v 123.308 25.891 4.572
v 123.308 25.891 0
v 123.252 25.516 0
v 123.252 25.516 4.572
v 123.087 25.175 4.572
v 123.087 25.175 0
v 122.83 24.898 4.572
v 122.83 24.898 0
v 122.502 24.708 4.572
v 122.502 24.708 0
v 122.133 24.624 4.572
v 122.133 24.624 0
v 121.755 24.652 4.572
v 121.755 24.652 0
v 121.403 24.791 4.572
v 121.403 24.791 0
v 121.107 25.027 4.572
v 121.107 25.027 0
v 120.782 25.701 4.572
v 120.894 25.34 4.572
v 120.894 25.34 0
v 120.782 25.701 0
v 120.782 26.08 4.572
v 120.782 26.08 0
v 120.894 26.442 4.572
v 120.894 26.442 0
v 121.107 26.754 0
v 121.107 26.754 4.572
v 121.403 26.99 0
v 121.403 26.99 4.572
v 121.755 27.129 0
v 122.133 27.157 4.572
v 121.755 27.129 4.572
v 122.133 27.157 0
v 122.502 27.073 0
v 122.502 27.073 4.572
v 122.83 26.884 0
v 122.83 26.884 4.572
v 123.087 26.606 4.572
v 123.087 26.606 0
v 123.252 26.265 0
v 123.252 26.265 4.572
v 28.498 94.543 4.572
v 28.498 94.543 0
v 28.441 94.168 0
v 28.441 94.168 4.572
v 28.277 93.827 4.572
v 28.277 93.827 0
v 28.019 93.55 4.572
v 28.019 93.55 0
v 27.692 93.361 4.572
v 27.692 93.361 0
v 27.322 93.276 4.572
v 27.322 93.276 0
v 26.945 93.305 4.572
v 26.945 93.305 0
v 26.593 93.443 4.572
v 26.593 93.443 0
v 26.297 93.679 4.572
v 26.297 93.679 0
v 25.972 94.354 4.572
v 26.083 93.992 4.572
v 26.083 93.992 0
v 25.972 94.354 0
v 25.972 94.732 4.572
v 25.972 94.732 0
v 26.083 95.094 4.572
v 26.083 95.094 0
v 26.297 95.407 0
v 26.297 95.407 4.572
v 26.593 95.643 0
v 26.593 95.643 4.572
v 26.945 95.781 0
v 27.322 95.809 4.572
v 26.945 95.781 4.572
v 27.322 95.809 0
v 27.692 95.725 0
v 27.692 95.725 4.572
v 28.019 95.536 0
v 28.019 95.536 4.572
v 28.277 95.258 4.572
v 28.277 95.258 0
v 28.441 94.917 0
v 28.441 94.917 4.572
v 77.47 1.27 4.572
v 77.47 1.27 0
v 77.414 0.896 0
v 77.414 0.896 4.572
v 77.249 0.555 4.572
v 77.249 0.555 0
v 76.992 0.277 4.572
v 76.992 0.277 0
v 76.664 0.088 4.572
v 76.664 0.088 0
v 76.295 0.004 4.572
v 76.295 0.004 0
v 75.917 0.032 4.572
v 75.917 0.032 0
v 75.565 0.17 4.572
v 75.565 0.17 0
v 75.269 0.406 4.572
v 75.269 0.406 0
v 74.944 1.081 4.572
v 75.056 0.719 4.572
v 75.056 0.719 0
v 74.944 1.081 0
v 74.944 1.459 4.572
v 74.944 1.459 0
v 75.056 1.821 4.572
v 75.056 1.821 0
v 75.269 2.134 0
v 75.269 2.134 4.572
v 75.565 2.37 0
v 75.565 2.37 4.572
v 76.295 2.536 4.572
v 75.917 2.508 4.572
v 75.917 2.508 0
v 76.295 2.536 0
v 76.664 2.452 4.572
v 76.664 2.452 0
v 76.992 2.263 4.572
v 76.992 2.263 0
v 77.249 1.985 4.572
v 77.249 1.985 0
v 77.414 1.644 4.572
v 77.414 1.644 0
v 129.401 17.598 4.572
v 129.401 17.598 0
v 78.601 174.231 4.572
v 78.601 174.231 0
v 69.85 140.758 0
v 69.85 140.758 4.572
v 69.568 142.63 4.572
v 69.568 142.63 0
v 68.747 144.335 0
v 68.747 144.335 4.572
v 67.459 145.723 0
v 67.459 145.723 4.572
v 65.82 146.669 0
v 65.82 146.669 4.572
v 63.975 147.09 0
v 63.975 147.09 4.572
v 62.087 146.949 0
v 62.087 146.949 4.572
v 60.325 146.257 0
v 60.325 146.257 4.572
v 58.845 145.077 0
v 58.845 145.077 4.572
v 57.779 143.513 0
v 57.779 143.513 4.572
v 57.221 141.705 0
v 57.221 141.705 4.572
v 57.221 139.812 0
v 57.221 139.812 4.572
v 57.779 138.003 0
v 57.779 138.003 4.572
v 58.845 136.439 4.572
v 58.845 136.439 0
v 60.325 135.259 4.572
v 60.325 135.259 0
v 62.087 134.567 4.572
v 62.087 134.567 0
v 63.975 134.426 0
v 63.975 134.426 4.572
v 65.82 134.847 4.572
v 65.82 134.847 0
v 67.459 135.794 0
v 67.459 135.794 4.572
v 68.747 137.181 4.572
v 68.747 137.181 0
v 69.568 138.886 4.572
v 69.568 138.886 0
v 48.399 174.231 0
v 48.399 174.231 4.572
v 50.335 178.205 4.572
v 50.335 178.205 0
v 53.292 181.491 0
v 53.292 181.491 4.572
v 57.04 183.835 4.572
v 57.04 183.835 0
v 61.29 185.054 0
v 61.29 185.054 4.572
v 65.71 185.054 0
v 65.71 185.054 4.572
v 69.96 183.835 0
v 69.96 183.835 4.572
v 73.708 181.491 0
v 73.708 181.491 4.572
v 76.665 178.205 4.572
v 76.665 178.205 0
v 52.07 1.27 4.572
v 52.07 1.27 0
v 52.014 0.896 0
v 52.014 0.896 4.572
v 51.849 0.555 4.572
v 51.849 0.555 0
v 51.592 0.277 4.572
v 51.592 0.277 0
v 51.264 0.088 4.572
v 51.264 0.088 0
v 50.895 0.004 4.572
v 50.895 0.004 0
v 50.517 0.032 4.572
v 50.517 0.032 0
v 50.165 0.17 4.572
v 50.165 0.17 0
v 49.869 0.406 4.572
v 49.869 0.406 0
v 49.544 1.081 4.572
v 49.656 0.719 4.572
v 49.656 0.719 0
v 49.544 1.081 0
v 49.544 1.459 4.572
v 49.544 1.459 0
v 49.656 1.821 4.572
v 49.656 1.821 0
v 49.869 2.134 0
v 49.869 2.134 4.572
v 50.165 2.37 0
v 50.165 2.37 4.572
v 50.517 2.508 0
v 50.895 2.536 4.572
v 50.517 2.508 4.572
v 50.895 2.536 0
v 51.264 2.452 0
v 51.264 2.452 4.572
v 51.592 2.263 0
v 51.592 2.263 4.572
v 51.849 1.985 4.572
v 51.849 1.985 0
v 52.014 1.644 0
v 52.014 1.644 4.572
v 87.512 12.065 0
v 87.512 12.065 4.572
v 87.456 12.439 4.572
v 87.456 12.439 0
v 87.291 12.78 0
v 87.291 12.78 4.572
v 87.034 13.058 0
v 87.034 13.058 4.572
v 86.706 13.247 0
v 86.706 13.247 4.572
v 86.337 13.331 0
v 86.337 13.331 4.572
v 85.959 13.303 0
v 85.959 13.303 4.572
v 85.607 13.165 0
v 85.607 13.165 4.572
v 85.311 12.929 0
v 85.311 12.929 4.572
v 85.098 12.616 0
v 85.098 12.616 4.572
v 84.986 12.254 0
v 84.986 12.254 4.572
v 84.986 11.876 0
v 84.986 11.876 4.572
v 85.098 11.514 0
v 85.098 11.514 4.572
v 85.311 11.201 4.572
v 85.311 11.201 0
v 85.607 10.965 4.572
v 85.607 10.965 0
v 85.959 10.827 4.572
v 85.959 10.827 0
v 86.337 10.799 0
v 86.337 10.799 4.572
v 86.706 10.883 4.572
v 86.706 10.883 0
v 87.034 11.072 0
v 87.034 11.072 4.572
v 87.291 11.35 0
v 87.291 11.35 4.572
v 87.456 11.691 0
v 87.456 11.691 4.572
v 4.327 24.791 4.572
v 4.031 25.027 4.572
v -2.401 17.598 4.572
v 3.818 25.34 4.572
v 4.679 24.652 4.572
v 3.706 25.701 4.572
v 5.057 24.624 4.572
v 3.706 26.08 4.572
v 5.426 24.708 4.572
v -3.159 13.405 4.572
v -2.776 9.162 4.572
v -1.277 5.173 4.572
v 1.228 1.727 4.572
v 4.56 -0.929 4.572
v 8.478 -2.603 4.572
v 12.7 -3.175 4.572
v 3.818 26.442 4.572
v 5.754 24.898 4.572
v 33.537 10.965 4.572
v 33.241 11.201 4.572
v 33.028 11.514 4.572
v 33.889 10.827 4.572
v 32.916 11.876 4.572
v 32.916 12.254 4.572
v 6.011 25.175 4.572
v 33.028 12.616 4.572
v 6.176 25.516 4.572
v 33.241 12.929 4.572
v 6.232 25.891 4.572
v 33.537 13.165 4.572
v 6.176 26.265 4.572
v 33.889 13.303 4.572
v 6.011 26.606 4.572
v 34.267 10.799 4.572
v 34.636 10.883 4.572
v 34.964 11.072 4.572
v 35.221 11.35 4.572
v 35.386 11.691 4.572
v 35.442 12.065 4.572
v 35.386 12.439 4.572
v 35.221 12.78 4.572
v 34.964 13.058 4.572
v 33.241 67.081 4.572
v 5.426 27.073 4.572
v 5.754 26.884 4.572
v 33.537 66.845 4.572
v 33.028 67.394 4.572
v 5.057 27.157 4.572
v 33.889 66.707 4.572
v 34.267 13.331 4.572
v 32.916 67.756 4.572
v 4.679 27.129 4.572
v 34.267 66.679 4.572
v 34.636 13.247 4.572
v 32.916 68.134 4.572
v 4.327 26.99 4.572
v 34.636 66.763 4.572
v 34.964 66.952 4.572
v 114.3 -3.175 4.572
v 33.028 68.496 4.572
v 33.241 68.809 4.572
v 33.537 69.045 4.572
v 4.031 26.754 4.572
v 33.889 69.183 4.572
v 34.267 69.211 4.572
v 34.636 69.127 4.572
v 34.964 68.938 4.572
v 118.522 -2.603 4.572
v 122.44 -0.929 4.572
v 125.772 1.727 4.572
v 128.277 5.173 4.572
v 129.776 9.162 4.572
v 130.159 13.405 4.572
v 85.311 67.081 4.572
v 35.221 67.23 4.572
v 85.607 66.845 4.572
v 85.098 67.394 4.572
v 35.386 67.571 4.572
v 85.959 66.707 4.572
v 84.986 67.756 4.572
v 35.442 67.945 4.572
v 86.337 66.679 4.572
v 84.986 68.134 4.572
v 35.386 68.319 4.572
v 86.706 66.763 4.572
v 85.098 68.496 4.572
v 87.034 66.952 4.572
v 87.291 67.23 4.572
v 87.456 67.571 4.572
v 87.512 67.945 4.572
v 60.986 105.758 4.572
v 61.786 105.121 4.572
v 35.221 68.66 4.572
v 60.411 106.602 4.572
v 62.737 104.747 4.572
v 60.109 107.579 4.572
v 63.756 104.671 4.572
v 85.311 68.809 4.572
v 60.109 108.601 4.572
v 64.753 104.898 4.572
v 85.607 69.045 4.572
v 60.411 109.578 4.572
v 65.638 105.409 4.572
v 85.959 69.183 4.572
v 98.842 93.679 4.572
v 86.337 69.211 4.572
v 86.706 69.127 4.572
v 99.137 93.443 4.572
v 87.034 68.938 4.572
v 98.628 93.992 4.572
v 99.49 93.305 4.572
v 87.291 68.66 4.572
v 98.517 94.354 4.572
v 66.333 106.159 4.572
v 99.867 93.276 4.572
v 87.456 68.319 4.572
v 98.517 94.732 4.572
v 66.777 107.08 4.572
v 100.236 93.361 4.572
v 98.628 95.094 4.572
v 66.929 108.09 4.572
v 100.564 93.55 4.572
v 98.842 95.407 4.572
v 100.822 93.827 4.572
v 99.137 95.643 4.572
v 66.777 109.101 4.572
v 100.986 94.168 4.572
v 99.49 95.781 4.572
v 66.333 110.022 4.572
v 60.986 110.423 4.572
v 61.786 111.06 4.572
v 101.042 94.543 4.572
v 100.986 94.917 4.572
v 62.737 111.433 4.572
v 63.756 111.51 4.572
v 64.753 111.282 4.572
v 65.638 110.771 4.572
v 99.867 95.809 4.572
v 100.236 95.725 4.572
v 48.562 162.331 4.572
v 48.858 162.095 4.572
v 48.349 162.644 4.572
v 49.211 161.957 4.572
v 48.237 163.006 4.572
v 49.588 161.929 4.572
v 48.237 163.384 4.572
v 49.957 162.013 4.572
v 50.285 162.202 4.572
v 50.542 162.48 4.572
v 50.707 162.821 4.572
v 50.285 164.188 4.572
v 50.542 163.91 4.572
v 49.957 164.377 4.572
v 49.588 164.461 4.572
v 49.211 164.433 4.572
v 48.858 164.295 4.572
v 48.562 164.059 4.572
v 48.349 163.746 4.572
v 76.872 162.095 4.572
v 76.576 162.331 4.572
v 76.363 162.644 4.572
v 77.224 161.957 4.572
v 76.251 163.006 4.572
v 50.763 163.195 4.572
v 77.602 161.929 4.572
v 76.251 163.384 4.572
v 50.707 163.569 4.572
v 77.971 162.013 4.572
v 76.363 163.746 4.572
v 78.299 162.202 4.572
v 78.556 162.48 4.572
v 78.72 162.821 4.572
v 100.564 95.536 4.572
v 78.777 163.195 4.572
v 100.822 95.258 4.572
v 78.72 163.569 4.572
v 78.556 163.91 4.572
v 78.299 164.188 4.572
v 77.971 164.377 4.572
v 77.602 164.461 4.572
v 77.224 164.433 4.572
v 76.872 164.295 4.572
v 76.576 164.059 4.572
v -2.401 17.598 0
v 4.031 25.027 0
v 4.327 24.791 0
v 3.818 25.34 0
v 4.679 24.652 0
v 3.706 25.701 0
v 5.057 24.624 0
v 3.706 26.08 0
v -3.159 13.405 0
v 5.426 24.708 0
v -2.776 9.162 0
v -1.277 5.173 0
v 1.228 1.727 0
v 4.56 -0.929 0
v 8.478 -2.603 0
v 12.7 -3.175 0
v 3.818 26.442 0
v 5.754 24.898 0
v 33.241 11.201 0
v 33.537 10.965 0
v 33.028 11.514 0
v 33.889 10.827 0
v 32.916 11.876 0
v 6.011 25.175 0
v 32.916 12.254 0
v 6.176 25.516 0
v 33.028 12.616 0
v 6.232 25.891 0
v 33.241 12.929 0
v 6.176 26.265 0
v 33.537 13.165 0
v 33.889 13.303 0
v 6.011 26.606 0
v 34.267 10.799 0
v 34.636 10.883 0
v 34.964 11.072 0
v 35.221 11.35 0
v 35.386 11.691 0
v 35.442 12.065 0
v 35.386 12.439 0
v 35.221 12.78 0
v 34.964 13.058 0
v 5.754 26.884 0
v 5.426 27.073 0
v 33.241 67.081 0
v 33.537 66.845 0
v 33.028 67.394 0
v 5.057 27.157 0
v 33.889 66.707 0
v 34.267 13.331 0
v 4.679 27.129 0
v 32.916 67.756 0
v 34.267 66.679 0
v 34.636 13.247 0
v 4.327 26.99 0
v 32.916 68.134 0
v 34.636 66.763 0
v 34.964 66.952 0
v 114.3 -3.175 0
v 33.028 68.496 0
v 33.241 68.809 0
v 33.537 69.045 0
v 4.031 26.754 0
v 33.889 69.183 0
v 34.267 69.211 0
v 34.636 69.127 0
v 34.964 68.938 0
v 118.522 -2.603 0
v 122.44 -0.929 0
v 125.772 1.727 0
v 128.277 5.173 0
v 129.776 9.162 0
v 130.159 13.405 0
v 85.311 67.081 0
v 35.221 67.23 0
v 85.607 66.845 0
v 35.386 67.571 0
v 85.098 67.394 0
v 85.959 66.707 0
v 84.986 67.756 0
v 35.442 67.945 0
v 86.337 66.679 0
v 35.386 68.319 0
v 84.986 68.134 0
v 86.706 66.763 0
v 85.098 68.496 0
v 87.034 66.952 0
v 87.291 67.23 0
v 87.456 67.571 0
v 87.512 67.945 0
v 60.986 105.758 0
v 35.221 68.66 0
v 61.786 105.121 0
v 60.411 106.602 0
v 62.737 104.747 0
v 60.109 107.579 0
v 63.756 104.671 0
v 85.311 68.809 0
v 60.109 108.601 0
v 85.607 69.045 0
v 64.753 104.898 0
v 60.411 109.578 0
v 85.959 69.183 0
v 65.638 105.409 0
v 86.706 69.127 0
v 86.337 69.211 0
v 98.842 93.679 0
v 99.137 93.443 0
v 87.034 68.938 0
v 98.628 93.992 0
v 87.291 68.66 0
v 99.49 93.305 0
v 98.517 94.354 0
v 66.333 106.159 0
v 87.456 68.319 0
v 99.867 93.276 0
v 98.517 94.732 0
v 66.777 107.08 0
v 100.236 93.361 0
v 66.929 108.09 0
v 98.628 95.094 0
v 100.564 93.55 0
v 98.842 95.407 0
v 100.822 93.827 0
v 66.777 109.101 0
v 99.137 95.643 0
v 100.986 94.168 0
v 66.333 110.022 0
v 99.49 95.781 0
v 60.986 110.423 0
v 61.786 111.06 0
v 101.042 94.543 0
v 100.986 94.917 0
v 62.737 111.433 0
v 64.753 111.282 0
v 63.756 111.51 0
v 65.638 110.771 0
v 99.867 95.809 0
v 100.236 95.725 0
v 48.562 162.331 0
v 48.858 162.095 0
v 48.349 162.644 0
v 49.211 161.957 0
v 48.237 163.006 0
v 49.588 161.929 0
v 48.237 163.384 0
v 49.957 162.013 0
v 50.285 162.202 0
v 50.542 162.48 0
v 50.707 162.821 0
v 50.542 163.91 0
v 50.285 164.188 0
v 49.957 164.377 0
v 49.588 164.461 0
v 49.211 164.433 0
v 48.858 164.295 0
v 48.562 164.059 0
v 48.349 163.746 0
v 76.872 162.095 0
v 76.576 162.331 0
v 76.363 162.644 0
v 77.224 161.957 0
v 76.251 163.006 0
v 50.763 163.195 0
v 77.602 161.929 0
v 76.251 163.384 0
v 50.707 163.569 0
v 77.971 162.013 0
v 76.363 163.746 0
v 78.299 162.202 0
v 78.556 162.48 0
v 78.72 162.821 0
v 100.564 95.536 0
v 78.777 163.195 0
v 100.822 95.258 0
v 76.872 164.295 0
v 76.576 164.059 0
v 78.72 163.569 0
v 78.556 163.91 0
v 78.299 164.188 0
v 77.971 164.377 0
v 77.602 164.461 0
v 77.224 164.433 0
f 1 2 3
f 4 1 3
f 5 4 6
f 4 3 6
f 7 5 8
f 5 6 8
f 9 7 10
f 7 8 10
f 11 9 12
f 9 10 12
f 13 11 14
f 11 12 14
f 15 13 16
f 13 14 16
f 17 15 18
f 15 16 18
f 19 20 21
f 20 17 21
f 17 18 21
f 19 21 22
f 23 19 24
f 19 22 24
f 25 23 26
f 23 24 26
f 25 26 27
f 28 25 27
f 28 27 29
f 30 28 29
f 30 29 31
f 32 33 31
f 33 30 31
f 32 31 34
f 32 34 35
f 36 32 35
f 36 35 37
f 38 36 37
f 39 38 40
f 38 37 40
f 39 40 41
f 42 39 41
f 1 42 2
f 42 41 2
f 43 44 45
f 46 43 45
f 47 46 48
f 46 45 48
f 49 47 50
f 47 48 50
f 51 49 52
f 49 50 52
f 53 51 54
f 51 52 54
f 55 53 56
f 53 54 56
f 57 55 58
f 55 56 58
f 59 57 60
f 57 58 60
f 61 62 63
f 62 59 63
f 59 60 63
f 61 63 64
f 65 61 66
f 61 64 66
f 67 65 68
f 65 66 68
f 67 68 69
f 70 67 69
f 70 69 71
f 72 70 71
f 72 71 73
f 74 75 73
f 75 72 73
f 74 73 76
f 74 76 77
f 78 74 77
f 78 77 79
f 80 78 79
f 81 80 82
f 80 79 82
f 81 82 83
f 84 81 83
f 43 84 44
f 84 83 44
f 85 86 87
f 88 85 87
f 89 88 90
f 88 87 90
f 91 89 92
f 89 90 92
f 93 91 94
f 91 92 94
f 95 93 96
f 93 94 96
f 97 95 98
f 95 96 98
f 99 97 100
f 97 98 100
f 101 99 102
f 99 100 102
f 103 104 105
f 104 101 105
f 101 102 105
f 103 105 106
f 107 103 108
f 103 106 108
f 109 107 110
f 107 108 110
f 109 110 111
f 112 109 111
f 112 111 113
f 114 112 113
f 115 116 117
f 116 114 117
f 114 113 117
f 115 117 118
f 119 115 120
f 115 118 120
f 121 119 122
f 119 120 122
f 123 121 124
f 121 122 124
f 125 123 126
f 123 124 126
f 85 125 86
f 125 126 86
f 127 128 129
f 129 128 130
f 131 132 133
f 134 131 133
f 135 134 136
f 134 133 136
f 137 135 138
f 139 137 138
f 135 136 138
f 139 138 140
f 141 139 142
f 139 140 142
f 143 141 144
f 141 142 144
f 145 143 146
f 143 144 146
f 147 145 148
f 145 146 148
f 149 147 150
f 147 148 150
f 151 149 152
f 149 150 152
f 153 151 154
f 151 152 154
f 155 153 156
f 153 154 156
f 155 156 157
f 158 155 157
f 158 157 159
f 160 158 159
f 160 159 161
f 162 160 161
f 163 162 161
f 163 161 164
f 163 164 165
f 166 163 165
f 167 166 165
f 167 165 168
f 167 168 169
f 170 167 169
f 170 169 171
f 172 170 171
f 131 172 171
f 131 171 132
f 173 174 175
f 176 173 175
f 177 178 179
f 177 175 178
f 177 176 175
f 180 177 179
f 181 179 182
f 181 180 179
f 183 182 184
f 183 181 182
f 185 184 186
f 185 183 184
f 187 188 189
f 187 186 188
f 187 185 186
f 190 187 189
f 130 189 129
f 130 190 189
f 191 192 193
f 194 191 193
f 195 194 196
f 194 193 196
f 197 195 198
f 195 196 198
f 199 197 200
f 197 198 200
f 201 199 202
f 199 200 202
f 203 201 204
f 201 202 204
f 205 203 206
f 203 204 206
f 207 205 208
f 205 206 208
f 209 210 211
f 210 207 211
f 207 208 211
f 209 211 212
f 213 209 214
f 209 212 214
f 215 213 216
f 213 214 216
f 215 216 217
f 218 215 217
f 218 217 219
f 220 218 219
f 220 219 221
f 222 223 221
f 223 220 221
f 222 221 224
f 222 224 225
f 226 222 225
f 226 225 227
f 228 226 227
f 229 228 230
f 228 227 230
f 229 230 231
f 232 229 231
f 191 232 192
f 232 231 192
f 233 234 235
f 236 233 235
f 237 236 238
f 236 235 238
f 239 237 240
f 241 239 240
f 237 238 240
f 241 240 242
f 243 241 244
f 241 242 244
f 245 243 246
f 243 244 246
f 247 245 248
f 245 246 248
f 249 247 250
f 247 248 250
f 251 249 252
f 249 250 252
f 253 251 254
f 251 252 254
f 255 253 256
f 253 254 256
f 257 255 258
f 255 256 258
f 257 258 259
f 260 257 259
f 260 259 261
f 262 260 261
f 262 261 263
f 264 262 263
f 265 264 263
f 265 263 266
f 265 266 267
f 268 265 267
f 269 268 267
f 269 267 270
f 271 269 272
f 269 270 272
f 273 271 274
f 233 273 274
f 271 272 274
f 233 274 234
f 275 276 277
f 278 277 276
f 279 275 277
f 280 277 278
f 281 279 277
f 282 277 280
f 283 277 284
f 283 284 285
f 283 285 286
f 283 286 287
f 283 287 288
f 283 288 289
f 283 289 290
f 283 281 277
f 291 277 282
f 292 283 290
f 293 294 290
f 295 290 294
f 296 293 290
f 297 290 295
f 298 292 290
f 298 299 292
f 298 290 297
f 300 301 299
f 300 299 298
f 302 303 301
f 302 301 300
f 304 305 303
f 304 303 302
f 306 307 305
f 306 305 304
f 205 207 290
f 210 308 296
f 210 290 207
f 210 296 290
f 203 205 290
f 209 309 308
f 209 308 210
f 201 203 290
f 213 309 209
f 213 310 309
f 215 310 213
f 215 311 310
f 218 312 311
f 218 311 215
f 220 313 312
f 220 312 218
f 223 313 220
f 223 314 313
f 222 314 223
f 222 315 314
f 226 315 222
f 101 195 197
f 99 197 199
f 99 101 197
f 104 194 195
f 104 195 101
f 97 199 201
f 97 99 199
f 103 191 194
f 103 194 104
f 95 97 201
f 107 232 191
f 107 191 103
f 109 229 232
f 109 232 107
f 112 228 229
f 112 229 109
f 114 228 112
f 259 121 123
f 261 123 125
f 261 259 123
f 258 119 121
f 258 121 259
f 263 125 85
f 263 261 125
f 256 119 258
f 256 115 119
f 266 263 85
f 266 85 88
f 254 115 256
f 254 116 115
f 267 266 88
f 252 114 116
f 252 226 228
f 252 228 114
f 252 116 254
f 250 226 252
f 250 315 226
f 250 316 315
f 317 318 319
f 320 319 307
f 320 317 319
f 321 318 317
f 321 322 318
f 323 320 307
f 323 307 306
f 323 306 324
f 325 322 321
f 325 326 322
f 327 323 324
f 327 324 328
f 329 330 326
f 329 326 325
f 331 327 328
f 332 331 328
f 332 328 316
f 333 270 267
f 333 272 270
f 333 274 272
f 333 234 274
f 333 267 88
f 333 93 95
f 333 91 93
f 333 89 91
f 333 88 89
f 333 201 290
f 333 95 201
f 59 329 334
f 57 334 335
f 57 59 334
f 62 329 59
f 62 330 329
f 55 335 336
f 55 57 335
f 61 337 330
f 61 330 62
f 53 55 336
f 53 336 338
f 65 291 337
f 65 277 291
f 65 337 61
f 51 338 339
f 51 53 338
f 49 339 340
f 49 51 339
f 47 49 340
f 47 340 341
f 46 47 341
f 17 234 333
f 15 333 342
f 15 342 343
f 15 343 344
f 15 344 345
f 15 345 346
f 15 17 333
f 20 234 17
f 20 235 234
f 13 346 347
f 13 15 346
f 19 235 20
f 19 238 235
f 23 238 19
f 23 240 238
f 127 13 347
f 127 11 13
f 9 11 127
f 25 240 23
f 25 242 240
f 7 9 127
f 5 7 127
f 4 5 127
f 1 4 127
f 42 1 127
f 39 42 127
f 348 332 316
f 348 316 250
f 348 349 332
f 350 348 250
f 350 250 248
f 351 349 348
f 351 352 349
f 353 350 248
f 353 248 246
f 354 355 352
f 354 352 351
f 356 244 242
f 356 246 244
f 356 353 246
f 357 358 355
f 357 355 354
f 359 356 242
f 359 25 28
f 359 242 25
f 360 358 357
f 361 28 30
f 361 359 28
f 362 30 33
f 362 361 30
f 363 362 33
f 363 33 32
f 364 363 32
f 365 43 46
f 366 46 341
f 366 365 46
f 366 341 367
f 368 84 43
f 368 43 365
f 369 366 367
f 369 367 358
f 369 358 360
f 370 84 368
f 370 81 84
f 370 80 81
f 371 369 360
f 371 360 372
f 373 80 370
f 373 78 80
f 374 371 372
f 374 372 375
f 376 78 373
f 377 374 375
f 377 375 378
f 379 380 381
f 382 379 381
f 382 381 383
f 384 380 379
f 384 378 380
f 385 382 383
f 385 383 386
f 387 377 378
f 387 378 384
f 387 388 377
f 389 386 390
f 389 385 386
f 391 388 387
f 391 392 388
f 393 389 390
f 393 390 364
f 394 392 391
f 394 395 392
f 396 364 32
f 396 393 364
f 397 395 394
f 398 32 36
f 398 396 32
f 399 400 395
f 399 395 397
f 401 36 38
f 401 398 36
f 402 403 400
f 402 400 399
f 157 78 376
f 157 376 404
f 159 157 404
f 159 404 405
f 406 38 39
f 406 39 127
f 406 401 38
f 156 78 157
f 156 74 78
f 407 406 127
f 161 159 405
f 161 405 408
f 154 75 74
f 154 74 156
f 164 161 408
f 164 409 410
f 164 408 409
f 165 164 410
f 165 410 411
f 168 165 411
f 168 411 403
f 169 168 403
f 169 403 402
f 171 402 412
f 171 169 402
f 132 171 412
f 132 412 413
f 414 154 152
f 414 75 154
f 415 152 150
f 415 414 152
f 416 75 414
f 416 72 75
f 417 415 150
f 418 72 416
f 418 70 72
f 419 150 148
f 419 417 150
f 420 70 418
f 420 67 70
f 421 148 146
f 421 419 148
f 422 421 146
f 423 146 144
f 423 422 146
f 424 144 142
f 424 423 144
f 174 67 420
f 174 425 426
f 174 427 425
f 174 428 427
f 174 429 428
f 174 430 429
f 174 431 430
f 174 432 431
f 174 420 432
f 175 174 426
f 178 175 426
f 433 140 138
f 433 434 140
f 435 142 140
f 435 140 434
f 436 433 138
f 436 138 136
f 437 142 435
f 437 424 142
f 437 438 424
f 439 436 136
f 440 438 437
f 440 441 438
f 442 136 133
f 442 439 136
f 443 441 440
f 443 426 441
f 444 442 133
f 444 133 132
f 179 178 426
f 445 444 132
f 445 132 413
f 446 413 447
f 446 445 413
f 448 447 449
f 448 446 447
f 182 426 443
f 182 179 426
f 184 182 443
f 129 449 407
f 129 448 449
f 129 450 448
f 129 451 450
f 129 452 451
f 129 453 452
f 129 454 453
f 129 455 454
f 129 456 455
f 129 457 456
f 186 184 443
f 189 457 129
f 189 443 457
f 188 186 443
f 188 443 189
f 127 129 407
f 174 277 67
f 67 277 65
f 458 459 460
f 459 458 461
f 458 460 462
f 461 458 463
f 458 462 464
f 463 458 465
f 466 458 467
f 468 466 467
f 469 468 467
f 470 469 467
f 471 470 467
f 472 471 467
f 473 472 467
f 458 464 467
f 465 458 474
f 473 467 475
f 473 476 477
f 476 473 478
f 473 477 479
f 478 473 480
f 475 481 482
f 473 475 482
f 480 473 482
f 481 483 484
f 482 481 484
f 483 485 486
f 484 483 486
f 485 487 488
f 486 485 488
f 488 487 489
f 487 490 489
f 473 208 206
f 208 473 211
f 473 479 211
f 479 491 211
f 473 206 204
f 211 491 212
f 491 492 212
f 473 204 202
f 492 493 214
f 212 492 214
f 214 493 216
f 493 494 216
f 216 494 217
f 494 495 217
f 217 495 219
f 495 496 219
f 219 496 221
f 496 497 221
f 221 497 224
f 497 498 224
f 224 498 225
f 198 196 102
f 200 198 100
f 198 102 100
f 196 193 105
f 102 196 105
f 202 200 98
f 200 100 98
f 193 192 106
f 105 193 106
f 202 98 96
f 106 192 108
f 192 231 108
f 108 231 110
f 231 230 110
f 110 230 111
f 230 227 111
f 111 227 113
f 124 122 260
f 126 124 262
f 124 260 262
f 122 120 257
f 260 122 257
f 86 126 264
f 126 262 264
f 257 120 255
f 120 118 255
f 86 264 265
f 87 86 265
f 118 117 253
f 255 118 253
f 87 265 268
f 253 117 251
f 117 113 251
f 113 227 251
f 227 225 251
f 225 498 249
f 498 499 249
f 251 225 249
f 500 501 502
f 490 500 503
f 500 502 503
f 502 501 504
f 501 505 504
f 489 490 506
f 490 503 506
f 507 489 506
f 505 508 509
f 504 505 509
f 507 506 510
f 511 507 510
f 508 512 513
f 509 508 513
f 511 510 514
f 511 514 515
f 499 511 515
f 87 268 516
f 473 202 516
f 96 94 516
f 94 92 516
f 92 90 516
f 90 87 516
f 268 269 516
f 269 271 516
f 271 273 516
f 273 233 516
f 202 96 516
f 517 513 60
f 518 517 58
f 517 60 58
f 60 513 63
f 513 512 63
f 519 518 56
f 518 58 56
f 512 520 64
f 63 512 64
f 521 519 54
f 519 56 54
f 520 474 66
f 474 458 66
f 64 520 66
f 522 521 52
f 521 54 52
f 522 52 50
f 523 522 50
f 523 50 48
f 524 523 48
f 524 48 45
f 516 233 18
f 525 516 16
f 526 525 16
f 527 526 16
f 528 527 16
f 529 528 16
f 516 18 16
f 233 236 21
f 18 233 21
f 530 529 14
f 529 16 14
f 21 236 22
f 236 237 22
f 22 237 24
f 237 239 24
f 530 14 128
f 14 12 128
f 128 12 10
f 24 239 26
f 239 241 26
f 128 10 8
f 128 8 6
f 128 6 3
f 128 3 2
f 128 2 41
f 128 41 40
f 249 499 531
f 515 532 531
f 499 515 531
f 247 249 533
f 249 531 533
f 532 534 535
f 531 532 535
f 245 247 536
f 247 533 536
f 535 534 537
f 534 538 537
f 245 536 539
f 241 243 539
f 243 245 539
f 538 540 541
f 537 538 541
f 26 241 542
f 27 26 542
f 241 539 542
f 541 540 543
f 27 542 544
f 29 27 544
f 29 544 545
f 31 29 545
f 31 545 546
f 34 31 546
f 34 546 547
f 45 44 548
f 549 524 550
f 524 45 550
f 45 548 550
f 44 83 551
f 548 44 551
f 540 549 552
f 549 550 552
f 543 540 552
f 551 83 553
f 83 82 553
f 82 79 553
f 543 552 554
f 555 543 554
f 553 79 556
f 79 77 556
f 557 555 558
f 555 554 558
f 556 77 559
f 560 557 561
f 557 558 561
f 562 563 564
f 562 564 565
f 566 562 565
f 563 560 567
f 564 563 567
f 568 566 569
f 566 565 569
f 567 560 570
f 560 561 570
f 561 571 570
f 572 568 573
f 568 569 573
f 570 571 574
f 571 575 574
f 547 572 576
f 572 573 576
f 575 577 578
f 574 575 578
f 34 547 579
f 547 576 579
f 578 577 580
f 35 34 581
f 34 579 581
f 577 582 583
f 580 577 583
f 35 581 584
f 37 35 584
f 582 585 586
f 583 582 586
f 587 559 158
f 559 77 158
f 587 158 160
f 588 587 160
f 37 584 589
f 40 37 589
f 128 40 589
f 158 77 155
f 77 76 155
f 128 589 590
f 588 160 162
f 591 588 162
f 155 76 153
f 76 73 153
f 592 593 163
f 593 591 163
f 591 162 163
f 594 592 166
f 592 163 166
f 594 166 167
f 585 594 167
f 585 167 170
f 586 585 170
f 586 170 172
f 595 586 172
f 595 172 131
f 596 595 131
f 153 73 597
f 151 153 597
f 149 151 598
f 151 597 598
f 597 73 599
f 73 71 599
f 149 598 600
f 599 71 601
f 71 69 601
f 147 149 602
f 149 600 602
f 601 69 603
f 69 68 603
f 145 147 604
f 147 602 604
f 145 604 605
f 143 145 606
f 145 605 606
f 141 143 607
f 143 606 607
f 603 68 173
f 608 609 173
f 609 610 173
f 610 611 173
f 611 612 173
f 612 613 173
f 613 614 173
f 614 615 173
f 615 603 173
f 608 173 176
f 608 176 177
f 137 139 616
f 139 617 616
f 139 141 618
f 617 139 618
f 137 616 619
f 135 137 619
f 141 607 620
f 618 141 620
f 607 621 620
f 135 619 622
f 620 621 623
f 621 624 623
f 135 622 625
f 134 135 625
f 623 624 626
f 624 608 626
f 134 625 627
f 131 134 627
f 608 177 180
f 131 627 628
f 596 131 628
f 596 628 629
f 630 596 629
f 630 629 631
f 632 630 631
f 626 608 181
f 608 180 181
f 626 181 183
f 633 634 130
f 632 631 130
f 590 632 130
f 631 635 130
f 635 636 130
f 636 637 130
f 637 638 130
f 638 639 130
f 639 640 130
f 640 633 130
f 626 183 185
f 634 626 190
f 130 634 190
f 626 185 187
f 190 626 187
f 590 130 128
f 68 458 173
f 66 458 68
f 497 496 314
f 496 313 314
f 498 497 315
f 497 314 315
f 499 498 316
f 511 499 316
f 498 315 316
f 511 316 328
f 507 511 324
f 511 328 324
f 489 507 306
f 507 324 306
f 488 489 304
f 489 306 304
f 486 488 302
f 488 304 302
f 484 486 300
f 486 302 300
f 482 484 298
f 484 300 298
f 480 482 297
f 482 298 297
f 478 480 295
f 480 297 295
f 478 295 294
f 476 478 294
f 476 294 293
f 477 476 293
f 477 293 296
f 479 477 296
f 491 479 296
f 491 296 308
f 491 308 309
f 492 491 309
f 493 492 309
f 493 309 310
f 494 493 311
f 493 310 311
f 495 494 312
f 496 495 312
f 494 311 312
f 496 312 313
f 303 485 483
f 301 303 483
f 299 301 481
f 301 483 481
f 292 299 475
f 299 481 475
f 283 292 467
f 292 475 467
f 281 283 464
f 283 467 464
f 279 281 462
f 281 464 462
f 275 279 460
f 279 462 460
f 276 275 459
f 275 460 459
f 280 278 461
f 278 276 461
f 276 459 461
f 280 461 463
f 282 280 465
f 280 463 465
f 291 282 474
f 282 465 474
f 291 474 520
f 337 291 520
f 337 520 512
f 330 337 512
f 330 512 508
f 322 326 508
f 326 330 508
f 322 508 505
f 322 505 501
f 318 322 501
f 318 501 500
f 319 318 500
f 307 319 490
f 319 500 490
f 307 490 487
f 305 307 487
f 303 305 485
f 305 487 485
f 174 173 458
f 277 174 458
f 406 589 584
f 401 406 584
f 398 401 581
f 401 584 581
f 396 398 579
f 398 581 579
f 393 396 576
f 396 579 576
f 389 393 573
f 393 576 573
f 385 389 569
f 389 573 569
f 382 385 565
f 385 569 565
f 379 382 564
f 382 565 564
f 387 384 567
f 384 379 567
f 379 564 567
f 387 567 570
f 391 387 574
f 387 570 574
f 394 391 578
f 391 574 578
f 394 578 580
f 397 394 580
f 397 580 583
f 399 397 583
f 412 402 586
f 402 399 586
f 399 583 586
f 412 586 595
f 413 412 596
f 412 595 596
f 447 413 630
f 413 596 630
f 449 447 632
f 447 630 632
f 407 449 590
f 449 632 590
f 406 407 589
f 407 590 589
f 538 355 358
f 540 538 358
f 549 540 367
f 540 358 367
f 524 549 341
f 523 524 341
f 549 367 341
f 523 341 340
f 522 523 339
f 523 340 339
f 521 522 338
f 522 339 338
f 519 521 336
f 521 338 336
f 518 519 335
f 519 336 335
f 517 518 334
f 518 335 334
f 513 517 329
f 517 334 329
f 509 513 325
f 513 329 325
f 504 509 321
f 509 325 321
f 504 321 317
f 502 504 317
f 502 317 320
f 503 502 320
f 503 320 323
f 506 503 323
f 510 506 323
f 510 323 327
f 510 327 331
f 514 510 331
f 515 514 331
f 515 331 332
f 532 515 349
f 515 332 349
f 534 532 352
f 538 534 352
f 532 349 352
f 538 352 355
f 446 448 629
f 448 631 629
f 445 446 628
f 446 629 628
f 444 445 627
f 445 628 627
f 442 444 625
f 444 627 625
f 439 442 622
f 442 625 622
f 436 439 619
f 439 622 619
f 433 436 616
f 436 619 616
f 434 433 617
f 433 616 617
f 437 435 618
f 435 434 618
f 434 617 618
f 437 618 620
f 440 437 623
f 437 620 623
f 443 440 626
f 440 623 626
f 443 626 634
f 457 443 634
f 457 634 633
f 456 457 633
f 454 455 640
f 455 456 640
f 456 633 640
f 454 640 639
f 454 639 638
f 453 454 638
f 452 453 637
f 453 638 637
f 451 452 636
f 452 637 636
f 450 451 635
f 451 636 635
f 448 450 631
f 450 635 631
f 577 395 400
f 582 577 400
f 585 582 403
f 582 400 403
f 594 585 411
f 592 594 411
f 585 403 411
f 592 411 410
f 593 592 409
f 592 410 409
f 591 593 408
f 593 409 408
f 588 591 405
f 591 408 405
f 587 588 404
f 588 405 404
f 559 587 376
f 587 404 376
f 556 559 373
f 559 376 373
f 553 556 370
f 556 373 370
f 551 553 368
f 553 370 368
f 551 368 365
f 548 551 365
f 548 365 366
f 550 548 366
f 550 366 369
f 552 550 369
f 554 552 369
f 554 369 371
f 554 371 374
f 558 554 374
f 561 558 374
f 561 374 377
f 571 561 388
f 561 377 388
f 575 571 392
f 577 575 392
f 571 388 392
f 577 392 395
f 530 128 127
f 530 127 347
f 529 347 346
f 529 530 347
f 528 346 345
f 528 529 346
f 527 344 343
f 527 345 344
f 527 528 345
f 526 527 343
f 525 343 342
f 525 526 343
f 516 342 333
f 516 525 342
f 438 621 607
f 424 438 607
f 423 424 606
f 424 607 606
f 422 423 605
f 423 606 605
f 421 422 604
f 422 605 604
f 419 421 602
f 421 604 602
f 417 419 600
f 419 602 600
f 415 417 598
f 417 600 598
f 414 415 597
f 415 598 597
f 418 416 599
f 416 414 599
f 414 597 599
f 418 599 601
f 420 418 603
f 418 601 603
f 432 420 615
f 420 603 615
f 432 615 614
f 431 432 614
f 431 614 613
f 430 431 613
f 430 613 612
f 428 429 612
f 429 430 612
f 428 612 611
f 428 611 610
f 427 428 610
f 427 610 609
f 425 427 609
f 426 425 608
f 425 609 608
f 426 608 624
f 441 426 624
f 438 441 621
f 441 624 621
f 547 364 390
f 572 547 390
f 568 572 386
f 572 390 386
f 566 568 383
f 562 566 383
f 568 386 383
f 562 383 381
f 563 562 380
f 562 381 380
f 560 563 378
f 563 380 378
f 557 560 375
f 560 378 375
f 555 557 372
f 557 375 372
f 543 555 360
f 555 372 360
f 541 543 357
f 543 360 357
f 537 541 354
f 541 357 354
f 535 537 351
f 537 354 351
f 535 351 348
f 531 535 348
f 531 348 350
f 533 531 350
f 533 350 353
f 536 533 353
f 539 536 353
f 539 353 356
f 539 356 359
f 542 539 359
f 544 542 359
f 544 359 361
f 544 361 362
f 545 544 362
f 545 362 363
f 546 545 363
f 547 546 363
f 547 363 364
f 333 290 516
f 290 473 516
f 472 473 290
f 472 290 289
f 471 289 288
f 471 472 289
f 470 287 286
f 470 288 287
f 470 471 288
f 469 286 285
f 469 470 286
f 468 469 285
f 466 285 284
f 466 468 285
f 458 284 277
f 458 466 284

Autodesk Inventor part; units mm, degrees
ref_plane "YZ Plane" through (0, 0, 0) normal (1, 0, 0) x (0, 1, 0)
ref_plane "XZ Plane" through (0, 0, 0) normal (0, 1, 0) x (-1, 0, 0)
sketch "Sketch1" plane through (0, 0, 0) normal (0, 0, 1) x (1, 0, 0)
  arc A0 (-2.400661, 17.597517) -> (12.7, -3.175) centre (12.7, 12.7) ccw
  arc A1 (114.3, -3.175) -> (129.400661, 17.597517) centre (114.3, 12.7) ccw
  line L0 (114.3, -3.175) -> (12.7, -3.175)
  line L1 (48.399339, 174.230681) -> (-2.400661, 17.597517)
  line L2 (129.400661, 17.597517) -> (78.600661, 174.230681)
  arc A2 (78.600661, 174.230681) -> (48.399339, 174.230681) centre (63.5, 169.333164) ccw
  arc A3 (75.580529, 173.251177) -> (51.419471, 173.251177) centre (63.5, 169.333164) ccw
  arc A4 (0.619471, 16.618013) -> (12.7, 0) centre (12.7, 12.7) ccw
  arc A5 (114.3, 0) -> (126.380529, 16.618013) centre (114.3, 12.7) ccw
  line L3 (12.7, 0) -> (114.3, 0)
  line L4 (0.619471, 16.618013) -> (51.419471, 173.251177)
  line L5 (75.580529, 173.251177) -> (126.380529, 16.618013)
  line L6 (0.619471, 16.618013) -> (3.753882, 26.282436)
  line L7 (3.753882, 26.282436) -> (4.961935, 25.890635)
  circle A6 centre (4.961935, 25.890635) radius 1.27
  line L8 (51.419471, 173.251177) -> (48.285061, 163.586755)
  line L9 (48.285061, 163.586755) -> (49.493113, 163.194953)
  circle A7 centre (49.493113, 163.194953) radius 1.27
  circle A8 centre (27.227524, 94.542794) radius 1.27
  line L10 (75.580529, 173.251177) -> (78.714939, 163.586755)
  line L11 (78.714939, 163.586755) -> (77.506886, 163.194953)
  circle A9 centre (77.506886, 163.194953) radius 1.27
  line L12 (126.380529, 16.618013) -> (123.246118, 26.282436)
  line L13 (123.246118, 26.282436) -> (122.038065, 25.890635)
  circle A10 centre (122.038065, 25.890635) radius 1.27
  circle A11 centre (99.772476, 94.542794) radius 1.27
  line L14 (63.5, 0) -> (63.5, 1.27) construction
  line L15 (63.5, 1.27) -> (76.2, 1.27) construction
  line L16 (63.5, 1.27) -> (50.8, 1.27) construction
  circle A12 centre (50.8, 1.27) radius 1.27
  circle A13 centre (76.2, 1.27) radius 1.27
  point P0 (0, 0)
  point P1 (0, 0)
  dimension "d50" = 2.54
  dimension "d53" = 2.54
  dimension "d39" = 31.75
  dimension "d40" = 31.75
  dimension "d41" = 25.4
  dimension "d42" = 25.4
  dimension "d43" = 25.4
  dimension "d44" = 10.16
  dimension "d45" = 10.16
  dimension "d46" = 1.27
  dimension "d47" = 1.27
  dimension "d48" = 10.16
  dimension "d49" = 10.16
  dimension "d51" = 2.54
  dimension "d52" = 2.54
  dimension "d91" = 12.7
  dimension "d92" = 12.7
ref_plane "Work Plane1" through (0, 0, 4.572) normal (0, 0, 1) x (1, 0, 0)
sketch "Sketch2" plane through (0, 0, 4.572) normal (0, 0, 1) x (1, 0, 0)
  line L0 (12.7, -3.175) -> (114.3, -3.175)
  line L1 (34.171935, 12.065) -> (34.171935, 67.945) construction
  line L2 (34.171935, 67.945) -> (86.241935, 67.945) construction
  line L3 (86.241935, 67.945) -> (86.241935, 12.065) construction
  line L4 (86.241935, 12.065) -> (34.171935, 12.065) construction
  line L5 (34.171935, 12.065) -> (86.241935, 67.945) construction
  line L6 (34.171935, 67.945) -> (86.241935, 12.065) construction
  circle A0 centre (34.171935, 67.945) radius 1.27
  circle A1 centre (34.171935, 12.065) radius 1.27
  circle A2 centre (86.241935, 12.065) radius 1.27
  circle A3 centre (86.241935, 67.945) radius 1.27
  circle A4 centre (4.961935, 25.890635) radius 1.27
  circle A5 centre (63.5, 140.758164) radius 6.35
  arc A6 (78.600661, 174.230681) -> (48.399339, 174.230681) centre (63.5, 169.333164) ccw
  circle A7 centre (63.5, 108.090258) radius 3.429
  point P0 (0, 0)
  point P1 (60.206935, 40.005)
  dimension "d71" = 55.88
  dimension "d73" = 52.07
  dimension "d74" = 2.54
  dimension "d75" = 2.54
  dimension "d76" = 2.54
  dimension "d77" = 2.54
  dimension "d80" = 52.07
  dimension "d81" = 15.24
  dimension "d82" = 29.21
  dimension "d84" = 12.7
  dimension "d87" = 38.1
  dimension "d88" = 6.858
sketch "Sketch1 outline for Extrusion8" plane through (0, 0, 0) normal (0, 0, 1) x (1, 0, 0)
  arc A0 (78.600661, 174.230681) -> (48.399339, 174.230681) centre (63.5, 169.333164) ccw
  line L0 (129.400661, 17.597517) -> (78.600661, 174.230681)
  line L1 (48.399339, 174.230681) -> (-2.400661, 17.597517)
  arc A1 (114.3, -3.175) -> (129.400661, 17.597517) centre (114.3, 12.7) ccw
  arc A2 (-2.400661, 17.597517) -> (12.7, -3.175) centre (12.7, 12.7) ccw
  line L2 (12.7, -3.175) -> (114.3, -3.175)
  circle A3 centre (4.961935, 25.890635) radius 1.27
  circle A4 centre (50.8, 1.27) radius 1.27
  circle A5 centre (76.2, 1.27) radius 1.27
  circle A6 centre (122.038065, 25.890635) radius 1.27
  circle A7 centre (27.227524, 94.542794) radius 1.27
  circle A8 centre (49.493113, 163.194953) radius 1.27
  circle A9 centre (99.772476, 94.542794) radius 1.27
  circle A10 centre (77.506886, 163.194953) radius 1.27
extrude "Extrusion8" add sketch "Sketch1 outline for Extrusion8" along normal blind 4.572
extrude "Extrusion9" cut sketch "Sketch2" against normal blind 4.572 contours A0 | A1 | A2 | A3 | A5 | A7
properties part number "Nathan_LED_Speaker_Back"
